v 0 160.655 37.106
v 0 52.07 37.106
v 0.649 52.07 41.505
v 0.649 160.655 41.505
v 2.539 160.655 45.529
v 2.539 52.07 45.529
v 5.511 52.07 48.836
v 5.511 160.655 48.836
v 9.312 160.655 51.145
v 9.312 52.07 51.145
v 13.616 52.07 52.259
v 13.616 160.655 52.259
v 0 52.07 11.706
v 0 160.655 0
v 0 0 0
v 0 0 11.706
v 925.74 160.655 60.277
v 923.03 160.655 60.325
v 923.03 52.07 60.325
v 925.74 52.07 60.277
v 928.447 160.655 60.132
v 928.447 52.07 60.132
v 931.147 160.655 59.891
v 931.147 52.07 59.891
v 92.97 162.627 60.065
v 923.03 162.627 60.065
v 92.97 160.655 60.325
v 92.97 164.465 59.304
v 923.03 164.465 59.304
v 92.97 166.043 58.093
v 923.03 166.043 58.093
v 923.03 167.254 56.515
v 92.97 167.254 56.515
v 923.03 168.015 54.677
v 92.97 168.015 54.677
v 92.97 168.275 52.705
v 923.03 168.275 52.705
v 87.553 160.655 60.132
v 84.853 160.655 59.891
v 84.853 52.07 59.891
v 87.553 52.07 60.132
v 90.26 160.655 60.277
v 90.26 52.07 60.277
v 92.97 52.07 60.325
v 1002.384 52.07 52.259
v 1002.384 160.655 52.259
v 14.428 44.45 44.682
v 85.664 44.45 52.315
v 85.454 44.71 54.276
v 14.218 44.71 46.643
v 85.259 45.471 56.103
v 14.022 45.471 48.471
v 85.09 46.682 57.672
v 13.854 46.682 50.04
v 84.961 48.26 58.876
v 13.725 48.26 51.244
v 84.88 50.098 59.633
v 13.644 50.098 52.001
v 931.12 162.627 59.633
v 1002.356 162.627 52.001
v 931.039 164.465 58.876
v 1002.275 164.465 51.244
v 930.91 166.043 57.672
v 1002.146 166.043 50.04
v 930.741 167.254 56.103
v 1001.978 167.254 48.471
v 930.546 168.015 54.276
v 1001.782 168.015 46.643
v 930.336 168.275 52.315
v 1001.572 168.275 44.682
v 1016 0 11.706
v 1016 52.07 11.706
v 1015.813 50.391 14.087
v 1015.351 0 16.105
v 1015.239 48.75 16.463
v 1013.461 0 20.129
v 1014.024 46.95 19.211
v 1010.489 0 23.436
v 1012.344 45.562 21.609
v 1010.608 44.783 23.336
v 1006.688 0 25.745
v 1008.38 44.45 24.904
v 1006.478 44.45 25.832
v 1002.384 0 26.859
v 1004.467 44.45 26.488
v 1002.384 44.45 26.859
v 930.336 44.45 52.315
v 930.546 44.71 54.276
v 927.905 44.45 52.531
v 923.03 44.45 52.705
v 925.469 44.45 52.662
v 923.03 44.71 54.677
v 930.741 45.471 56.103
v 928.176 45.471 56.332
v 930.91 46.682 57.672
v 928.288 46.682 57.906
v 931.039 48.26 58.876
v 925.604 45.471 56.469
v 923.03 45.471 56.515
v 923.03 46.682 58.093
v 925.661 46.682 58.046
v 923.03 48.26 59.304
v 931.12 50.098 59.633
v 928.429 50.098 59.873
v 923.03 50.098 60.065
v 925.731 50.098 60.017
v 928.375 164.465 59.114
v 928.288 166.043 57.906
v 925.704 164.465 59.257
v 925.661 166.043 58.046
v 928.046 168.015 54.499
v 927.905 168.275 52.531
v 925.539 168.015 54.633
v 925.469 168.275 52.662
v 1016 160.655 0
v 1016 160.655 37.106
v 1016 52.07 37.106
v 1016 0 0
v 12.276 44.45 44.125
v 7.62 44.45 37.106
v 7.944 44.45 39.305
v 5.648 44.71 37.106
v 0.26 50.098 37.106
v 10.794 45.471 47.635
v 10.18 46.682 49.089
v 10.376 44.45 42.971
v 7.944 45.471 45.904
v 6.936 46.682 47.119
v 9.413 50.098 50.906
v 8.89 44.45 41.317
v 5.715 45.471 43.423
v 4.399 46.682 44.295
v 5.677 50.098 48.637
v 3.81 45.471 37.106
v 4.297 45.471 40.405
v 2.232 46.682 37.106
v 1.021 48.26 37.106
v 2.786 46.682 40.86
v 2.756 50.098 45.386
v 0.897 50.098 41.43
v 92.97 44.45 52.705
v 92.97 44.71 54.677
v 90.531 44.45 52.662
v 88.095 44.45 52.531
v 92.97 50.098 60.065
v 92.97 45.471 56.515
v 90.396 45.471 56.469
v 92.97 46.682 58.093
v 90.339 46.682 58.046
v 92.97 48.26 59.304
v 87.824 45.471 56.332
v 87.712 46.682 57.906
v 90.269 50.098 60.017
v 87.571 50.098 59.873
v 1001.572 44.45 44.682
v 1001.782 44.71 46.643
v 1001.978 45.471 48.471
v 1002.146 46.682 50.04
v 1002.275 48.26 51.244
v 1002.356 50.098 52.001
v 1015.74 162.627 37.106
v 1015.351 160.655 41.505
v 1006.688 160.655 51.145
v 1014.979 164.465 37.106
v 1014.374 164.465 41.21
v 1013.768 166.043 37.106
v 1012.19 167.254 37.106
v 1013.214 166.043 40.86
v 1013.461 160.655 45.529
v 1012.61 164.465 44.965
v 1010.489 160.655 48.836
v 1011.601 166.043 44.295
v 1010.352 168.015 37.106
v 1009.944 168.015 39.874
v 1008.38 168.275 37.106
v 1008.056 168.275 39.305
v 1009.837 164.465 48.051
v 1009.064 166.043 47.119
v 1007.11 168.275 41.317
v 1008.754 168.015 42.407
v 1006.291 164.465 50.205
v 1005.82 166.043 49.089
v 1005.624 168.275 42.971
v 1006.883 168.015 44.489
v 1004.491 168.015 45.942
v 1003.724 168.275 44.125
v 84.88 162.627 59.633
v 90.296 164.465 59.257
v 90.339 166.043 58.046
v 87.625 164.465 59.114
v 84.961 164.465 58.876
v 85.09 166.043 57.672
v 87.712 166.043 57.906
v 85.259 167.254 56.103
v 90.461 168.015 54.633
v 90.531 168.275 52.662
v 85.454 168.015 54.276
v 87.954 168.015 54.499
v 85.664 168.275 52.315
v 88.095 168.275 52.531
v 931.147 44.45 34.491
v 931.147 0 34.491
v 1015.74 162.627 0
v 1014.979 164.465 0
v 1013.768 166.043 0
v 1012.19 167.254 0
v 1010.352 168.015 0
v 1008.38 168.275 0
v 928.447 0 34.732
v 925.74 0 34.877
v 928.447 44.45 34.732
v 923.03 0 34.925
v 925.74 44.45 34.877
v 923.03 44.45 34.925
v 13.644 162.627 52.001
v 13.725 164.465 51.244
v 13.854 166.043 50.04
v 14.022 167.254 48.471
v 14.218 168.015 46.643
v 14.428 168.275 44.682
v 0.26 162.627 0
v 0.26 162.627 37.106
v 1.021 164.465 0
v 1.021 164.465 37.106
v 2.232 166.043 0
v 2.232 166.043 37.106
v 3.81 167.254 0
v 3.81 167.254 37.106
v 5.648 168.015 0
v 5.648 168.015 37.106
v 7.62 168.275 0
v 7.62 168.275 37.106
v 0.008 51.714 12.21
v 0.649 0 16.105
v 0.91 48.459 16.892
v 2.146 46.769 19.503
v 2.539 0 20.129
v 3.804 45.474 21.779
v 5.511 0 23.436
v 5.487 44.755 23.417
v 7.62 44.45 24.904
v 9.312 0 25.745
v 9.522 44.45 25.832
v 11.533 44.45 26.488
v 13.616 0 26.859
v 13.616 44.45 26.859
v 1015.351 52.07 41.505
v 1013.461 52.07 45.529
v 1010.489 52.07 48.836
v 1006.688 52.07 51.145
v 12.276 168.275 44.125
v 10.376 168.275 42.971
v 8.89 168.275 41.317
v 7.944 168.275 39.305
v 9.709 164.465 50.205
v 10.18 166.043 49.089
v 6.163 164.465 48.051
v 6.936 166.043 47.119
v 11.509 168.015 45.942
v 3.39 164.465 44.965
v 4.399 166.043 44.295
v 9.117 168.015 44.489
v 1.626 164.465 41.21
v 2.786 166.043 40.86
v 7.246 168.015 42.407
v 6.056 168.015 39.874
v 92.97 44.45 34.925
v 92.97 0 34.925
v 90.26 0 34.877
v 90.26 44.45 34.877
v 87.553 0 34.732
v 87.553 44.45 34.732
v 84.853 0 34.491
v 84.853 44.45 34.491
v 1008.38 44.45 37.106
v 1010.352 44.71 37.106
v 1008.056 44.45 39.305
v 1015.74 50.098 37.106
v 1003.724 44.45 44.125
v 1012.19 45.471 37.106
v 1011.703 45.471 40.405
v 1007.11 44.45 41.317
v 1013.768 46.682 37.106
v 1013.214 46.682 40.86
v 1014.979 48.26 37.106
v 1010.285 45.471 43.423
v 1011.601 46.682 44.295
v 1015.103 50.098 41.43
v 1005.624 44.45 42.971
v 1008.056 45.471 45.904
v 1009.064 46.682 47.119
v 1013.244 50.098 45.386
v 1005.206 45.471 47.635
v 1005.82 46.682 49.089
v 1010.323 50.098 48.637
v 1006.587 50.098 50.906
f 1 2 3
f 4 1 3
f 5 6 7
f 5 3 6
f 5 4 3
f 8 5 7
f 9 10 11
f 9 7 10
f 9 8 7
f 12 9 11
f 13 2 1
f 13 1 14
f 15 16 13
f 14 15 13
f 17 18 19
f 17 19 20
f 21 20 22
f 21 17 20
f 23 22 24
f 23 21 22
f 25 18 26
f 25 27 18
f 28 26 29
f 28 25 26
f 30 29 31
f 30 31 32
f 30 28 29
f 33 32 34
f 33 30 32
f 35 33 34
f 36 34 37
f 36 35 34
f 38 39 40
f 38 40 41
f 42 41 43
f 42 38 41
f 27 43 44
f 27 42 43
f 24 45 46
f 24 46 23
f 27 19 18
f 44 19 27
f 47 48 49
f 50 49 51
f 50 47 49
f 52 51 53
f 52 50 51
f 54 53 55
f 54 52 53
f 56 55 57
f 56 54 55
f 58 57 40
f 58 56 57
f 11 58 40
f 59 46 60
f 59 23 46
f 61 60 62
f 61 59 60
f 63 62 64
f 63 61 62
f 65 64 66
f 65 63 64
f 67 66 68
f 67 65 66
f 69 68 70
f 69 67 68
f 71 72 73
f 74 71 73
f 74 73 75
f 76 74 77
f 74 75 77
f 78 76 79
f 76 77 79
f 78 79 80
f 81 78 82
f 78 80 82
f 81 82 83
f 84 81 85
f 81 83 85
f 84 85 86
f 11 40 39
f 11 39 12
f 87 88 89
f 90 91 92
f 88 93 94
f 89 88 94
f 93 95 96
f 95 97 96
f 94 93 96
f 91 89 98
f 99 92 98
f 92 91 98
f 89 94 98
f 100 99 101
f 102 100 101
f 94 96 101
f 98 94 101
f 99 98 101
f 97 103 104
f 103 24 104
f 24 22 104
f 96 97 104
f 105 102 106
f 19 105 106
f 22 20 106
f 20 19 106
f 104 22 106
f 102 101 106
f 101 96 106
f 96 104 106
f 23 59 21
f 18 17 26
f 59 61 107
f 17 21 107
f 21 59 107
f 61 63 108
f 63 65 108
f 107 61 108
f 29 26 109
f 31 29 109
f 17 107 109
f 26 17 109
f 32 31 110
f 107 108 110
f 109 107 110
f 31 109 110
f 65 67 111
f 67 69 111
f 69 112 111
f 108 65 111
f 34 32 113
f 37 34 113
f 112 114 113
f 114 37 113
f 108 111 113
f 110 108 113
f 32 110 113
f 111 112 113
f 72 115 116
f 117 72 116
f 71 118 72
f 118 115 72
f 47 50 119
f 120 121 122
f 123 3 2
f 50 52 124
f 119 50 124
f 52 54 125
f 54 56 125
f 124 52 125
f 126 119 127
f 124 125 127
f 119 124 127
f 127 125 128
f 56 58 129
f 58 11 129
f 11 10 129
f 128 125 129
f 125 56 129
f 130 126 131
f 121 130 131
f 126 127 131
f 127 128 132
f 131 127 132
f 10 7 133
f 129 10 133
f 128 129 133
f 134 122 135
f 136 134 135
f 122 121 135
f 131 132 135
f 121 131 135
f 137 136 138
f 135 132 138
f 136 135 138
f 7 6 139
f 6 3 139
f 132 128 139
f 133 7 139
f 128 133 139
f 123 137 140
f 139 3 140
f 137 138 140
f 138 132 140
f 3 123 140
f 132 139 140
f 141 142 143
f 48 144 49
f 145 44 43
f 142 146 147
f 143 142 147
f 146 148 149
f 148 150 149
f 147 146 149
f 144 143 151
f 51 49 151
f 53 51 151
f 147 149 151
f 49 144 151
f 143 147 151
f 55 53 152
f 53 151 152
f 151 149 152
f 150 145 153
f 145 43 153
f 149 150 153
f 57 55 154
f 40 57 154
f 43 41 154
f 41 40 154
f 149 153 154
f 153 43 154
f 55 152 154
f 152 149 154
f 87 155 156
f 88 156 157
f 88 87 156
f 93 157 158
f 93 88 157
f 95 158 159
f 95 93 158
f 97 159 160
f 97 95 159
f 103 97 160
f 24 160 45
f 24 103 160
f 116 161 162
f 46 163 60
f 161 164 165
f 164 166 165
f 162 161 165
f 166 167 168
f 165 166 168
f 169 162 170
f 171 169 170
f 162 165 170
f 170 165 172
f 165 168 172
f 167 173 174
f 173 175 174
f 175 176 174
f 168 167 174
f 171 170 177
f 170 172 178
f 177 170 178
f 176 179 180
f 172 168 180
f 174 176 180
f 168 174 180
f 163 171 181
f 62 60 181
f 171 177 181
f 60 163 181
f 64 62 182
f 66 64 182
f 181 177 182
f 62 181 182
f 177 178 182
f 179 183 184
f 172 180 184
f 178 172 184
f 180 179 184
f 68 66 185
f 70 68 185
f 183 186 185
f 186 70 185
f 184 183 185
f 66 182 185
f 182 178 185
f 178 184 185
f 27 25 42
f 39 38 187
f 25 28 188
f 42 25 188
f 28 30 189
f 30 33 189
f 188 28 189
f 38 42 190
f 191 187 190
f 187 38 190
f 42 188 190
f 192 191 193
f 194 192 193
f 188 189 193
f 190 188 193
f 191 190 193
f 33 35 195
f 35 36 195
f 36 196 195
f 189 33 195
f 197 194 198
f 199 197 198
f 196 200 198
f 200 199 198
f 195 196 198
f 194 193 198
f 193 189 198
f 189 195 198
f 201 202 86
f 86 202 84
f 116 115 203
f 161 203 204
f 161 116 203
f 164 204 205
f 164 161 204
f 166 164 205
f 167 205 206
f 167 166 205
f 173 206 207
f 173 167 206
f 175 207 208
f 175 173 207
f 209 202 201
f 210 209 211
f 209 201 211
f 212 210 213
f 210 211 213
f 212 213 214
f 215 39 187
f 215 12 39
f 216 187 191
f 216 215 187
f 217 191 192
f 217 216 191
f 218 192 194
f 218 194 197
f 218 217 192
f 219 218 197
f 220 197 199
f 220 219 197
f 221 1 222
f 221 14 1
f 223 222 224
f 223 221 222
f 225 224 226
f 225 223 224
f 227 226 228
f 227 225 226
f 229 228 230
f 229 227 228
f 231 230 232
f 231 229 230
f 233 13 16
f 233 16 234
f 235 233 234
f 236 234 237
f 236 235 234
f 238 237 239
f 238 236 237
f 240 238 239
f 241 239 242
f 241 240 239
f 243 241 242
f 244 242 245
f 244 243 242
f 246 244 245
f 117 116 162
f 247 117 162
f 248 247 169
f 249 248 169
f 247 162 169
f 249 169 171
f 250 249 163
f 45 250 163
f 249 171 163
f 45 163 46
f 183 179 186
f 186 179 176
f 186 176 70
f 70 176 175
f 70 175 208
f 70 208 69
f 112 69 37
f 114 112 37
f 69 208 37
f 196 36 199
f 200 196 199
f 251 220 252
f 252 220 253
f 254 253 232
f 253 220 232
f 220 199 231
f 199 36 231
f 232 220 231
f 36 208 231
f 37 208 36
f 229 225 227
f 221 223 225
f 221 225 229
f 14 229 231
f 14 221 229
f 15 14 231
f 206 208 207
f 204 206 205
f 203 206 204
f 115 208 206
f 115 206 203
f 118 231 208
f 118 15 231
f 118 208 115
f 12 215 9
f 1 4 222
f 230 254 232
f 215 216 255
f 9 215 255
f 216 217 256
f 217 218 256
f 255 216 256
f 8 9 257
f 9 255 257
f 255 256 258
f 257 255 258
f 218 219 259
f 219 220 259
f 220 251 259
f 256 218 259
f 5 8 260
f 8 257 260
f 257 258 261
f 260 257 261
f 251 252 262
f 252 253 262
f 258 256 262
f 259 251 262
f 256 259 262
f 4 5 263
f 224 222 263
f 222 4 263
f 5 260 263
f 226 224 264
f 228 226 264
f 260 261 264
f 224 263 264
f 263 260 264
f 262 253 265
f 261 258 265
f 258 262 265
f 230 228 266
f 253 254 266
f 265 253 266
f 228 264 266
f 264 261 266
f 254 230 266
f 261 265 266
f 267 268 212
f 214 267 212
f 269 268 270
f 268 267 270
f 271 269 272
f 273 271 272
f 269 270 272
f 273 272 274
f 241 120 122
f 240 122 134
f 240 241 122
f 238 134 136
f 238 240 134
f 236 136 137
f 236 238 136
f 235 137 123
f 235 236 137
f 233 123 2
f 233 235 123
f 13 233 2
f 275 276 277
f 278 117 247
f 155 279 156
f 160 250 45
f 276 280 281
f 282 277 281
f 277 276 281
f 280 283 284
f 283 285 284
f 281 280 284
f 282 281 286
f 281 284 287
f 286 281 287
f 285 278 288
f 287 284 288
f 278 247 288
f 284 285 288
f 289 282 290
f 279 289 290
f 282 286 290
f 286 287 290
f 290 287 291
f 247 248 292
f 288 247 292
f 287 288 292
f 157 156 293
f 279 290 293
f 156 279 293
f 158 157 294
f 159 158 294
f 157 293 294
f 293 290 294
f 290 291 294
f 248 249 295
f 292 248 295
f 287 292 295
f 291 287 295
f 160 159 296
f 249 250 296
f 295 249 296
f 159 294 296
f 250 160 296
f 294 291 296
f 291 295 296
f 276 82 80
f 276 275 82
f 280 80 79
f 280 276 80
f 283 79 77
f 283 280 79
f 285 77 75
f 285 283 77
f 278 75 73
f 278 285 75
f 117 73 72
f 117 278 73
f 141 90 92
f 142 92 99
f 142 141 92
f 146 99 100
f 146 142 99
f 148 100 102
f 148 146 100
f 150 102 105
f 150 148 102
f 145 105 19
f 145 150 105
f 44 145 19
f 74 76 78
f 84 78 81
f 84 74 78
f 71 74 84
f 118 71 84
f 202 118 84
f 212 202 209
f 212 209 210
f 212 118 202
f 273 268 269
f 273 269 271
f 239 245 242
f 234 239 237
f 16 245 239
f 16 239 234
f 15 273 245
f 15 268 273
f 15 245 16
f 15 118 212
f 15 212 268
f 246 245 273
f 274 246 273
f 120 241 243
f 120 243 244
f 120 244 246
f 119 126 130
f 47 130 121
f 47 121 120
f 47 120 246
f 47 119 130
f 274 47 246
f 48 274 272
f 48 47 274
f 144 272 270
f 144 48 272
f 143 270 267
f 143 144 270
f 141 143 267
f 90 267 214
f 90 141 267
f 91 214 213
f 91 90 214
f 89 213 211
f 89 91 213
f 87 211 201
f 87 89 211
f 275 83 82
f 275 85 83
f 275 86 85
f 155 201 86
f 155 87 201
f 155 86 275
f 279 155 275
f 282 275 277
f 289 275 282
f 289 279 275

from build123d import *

# Parameters (mm, degrees)
BOSS_EXTRUDE1_DEPTH = 168.275
CUT_EXTRUDE1_DEPTH  = 44.45
FILLET1_R           = 15.24
FILLET2_R           = 76.2
FILLET3_R           = 7.62
FILLET4_R           = 7.62


with BuildPart() as part:
    # Sketch7 → Boss-Extrude1 (new body)
    with BuildSketch(Plane(origin=(0, 0, 0), x_dir=(1, 0, 0), z_dir=(0, 1, 0))):
        Polygon((0, 0), (1016, 0), (1016, -50.8), (927.1, -60.325), (88.9, -60.325), (0, -50.8), align=None)
    extrude(amount=BOSS_EXTRUDE1_DEPTH)

    # Sketch10 → Cut-Extrude1 (cut)
    with BuildSketch(Plane.XZ):
        Polygon((0, 50.8), (0, 25.4), (88.9, 34.925), (927.1, 34.925), (1016, 25.4), (1016, 50.8), (927.1, 60.325), (88.9, 60.325), align=None)
    extrude(amount=-CUT_EXTRUDE1_DEPTH, mode=Mode.SUBTRACT)

    # Fillet1
    fillet1_edges = [part.edges().sort_by_distance(p)[0] for p in [
        (1016, 106.3625, 50.8),
        (0, 106.3625, 50.8),
        (1016, 22.225, 25.4),
        (0, 22.225, 25.4),
    ]]
    fillet(fillet1_edges, radius=FILLET1_R)

    # Fillet2
    fillet2_edges = [part.edges().sort_by_distance(p)[0] for p in [
        (927.1, 106.3625, 60.325),
        (88.9, 106.3625, 60.325),
        (927.1, 22.225, 34.925),
        (88.9, 22.225, 34.925),
    ]]
    fillet(fillet2_edges, radius=FILLET2_R)

    # Fillet3
    fillet3_edges = [part.edges().sort_by_distance(p)[0] for p in [
        (1016, 168.275, 18.552816133),
        (0, 168.275, 18.552816133),
        (49.234552732, 168.275, 56.07513065),
        (3.904199904, 168.275, 47.291761863),
        (1012.095800096, 168.275, 47.291761863),
        (966.765447268, 168.275, 56.07513065),
        (508, 168.275, 60.325),
        (88.905795265, 168.275, 60.216512154),
        (927.094204735, 168.275, 60.216512154),
    ]]
    fillet(fillet3_edges, radius=FILLET3_R)

    # Fillet4
    fillet4_edges = [part.edges().sort_by_distance(p)[0] for p in [
        (1016, 44.45, 18.552816133),
        (0, 44.45, 18.552816133),
        (966.765447268, 44.45, 56.07513065),
        (3.904199904, 44.45, 47.291761863),
        (1012.095800096, 44.45, 47.291761863),
        (508, 44.45, 60.325),
        (49.234552732, 44.45, 56.07513065),
        (88.905795265, 44.45, 60.216512154),
        (927.094204735, 44.45, 60.216512154),
    ]]
    fillet(fillet4_edges, radius=FILLET4_R)


solid = part.part
